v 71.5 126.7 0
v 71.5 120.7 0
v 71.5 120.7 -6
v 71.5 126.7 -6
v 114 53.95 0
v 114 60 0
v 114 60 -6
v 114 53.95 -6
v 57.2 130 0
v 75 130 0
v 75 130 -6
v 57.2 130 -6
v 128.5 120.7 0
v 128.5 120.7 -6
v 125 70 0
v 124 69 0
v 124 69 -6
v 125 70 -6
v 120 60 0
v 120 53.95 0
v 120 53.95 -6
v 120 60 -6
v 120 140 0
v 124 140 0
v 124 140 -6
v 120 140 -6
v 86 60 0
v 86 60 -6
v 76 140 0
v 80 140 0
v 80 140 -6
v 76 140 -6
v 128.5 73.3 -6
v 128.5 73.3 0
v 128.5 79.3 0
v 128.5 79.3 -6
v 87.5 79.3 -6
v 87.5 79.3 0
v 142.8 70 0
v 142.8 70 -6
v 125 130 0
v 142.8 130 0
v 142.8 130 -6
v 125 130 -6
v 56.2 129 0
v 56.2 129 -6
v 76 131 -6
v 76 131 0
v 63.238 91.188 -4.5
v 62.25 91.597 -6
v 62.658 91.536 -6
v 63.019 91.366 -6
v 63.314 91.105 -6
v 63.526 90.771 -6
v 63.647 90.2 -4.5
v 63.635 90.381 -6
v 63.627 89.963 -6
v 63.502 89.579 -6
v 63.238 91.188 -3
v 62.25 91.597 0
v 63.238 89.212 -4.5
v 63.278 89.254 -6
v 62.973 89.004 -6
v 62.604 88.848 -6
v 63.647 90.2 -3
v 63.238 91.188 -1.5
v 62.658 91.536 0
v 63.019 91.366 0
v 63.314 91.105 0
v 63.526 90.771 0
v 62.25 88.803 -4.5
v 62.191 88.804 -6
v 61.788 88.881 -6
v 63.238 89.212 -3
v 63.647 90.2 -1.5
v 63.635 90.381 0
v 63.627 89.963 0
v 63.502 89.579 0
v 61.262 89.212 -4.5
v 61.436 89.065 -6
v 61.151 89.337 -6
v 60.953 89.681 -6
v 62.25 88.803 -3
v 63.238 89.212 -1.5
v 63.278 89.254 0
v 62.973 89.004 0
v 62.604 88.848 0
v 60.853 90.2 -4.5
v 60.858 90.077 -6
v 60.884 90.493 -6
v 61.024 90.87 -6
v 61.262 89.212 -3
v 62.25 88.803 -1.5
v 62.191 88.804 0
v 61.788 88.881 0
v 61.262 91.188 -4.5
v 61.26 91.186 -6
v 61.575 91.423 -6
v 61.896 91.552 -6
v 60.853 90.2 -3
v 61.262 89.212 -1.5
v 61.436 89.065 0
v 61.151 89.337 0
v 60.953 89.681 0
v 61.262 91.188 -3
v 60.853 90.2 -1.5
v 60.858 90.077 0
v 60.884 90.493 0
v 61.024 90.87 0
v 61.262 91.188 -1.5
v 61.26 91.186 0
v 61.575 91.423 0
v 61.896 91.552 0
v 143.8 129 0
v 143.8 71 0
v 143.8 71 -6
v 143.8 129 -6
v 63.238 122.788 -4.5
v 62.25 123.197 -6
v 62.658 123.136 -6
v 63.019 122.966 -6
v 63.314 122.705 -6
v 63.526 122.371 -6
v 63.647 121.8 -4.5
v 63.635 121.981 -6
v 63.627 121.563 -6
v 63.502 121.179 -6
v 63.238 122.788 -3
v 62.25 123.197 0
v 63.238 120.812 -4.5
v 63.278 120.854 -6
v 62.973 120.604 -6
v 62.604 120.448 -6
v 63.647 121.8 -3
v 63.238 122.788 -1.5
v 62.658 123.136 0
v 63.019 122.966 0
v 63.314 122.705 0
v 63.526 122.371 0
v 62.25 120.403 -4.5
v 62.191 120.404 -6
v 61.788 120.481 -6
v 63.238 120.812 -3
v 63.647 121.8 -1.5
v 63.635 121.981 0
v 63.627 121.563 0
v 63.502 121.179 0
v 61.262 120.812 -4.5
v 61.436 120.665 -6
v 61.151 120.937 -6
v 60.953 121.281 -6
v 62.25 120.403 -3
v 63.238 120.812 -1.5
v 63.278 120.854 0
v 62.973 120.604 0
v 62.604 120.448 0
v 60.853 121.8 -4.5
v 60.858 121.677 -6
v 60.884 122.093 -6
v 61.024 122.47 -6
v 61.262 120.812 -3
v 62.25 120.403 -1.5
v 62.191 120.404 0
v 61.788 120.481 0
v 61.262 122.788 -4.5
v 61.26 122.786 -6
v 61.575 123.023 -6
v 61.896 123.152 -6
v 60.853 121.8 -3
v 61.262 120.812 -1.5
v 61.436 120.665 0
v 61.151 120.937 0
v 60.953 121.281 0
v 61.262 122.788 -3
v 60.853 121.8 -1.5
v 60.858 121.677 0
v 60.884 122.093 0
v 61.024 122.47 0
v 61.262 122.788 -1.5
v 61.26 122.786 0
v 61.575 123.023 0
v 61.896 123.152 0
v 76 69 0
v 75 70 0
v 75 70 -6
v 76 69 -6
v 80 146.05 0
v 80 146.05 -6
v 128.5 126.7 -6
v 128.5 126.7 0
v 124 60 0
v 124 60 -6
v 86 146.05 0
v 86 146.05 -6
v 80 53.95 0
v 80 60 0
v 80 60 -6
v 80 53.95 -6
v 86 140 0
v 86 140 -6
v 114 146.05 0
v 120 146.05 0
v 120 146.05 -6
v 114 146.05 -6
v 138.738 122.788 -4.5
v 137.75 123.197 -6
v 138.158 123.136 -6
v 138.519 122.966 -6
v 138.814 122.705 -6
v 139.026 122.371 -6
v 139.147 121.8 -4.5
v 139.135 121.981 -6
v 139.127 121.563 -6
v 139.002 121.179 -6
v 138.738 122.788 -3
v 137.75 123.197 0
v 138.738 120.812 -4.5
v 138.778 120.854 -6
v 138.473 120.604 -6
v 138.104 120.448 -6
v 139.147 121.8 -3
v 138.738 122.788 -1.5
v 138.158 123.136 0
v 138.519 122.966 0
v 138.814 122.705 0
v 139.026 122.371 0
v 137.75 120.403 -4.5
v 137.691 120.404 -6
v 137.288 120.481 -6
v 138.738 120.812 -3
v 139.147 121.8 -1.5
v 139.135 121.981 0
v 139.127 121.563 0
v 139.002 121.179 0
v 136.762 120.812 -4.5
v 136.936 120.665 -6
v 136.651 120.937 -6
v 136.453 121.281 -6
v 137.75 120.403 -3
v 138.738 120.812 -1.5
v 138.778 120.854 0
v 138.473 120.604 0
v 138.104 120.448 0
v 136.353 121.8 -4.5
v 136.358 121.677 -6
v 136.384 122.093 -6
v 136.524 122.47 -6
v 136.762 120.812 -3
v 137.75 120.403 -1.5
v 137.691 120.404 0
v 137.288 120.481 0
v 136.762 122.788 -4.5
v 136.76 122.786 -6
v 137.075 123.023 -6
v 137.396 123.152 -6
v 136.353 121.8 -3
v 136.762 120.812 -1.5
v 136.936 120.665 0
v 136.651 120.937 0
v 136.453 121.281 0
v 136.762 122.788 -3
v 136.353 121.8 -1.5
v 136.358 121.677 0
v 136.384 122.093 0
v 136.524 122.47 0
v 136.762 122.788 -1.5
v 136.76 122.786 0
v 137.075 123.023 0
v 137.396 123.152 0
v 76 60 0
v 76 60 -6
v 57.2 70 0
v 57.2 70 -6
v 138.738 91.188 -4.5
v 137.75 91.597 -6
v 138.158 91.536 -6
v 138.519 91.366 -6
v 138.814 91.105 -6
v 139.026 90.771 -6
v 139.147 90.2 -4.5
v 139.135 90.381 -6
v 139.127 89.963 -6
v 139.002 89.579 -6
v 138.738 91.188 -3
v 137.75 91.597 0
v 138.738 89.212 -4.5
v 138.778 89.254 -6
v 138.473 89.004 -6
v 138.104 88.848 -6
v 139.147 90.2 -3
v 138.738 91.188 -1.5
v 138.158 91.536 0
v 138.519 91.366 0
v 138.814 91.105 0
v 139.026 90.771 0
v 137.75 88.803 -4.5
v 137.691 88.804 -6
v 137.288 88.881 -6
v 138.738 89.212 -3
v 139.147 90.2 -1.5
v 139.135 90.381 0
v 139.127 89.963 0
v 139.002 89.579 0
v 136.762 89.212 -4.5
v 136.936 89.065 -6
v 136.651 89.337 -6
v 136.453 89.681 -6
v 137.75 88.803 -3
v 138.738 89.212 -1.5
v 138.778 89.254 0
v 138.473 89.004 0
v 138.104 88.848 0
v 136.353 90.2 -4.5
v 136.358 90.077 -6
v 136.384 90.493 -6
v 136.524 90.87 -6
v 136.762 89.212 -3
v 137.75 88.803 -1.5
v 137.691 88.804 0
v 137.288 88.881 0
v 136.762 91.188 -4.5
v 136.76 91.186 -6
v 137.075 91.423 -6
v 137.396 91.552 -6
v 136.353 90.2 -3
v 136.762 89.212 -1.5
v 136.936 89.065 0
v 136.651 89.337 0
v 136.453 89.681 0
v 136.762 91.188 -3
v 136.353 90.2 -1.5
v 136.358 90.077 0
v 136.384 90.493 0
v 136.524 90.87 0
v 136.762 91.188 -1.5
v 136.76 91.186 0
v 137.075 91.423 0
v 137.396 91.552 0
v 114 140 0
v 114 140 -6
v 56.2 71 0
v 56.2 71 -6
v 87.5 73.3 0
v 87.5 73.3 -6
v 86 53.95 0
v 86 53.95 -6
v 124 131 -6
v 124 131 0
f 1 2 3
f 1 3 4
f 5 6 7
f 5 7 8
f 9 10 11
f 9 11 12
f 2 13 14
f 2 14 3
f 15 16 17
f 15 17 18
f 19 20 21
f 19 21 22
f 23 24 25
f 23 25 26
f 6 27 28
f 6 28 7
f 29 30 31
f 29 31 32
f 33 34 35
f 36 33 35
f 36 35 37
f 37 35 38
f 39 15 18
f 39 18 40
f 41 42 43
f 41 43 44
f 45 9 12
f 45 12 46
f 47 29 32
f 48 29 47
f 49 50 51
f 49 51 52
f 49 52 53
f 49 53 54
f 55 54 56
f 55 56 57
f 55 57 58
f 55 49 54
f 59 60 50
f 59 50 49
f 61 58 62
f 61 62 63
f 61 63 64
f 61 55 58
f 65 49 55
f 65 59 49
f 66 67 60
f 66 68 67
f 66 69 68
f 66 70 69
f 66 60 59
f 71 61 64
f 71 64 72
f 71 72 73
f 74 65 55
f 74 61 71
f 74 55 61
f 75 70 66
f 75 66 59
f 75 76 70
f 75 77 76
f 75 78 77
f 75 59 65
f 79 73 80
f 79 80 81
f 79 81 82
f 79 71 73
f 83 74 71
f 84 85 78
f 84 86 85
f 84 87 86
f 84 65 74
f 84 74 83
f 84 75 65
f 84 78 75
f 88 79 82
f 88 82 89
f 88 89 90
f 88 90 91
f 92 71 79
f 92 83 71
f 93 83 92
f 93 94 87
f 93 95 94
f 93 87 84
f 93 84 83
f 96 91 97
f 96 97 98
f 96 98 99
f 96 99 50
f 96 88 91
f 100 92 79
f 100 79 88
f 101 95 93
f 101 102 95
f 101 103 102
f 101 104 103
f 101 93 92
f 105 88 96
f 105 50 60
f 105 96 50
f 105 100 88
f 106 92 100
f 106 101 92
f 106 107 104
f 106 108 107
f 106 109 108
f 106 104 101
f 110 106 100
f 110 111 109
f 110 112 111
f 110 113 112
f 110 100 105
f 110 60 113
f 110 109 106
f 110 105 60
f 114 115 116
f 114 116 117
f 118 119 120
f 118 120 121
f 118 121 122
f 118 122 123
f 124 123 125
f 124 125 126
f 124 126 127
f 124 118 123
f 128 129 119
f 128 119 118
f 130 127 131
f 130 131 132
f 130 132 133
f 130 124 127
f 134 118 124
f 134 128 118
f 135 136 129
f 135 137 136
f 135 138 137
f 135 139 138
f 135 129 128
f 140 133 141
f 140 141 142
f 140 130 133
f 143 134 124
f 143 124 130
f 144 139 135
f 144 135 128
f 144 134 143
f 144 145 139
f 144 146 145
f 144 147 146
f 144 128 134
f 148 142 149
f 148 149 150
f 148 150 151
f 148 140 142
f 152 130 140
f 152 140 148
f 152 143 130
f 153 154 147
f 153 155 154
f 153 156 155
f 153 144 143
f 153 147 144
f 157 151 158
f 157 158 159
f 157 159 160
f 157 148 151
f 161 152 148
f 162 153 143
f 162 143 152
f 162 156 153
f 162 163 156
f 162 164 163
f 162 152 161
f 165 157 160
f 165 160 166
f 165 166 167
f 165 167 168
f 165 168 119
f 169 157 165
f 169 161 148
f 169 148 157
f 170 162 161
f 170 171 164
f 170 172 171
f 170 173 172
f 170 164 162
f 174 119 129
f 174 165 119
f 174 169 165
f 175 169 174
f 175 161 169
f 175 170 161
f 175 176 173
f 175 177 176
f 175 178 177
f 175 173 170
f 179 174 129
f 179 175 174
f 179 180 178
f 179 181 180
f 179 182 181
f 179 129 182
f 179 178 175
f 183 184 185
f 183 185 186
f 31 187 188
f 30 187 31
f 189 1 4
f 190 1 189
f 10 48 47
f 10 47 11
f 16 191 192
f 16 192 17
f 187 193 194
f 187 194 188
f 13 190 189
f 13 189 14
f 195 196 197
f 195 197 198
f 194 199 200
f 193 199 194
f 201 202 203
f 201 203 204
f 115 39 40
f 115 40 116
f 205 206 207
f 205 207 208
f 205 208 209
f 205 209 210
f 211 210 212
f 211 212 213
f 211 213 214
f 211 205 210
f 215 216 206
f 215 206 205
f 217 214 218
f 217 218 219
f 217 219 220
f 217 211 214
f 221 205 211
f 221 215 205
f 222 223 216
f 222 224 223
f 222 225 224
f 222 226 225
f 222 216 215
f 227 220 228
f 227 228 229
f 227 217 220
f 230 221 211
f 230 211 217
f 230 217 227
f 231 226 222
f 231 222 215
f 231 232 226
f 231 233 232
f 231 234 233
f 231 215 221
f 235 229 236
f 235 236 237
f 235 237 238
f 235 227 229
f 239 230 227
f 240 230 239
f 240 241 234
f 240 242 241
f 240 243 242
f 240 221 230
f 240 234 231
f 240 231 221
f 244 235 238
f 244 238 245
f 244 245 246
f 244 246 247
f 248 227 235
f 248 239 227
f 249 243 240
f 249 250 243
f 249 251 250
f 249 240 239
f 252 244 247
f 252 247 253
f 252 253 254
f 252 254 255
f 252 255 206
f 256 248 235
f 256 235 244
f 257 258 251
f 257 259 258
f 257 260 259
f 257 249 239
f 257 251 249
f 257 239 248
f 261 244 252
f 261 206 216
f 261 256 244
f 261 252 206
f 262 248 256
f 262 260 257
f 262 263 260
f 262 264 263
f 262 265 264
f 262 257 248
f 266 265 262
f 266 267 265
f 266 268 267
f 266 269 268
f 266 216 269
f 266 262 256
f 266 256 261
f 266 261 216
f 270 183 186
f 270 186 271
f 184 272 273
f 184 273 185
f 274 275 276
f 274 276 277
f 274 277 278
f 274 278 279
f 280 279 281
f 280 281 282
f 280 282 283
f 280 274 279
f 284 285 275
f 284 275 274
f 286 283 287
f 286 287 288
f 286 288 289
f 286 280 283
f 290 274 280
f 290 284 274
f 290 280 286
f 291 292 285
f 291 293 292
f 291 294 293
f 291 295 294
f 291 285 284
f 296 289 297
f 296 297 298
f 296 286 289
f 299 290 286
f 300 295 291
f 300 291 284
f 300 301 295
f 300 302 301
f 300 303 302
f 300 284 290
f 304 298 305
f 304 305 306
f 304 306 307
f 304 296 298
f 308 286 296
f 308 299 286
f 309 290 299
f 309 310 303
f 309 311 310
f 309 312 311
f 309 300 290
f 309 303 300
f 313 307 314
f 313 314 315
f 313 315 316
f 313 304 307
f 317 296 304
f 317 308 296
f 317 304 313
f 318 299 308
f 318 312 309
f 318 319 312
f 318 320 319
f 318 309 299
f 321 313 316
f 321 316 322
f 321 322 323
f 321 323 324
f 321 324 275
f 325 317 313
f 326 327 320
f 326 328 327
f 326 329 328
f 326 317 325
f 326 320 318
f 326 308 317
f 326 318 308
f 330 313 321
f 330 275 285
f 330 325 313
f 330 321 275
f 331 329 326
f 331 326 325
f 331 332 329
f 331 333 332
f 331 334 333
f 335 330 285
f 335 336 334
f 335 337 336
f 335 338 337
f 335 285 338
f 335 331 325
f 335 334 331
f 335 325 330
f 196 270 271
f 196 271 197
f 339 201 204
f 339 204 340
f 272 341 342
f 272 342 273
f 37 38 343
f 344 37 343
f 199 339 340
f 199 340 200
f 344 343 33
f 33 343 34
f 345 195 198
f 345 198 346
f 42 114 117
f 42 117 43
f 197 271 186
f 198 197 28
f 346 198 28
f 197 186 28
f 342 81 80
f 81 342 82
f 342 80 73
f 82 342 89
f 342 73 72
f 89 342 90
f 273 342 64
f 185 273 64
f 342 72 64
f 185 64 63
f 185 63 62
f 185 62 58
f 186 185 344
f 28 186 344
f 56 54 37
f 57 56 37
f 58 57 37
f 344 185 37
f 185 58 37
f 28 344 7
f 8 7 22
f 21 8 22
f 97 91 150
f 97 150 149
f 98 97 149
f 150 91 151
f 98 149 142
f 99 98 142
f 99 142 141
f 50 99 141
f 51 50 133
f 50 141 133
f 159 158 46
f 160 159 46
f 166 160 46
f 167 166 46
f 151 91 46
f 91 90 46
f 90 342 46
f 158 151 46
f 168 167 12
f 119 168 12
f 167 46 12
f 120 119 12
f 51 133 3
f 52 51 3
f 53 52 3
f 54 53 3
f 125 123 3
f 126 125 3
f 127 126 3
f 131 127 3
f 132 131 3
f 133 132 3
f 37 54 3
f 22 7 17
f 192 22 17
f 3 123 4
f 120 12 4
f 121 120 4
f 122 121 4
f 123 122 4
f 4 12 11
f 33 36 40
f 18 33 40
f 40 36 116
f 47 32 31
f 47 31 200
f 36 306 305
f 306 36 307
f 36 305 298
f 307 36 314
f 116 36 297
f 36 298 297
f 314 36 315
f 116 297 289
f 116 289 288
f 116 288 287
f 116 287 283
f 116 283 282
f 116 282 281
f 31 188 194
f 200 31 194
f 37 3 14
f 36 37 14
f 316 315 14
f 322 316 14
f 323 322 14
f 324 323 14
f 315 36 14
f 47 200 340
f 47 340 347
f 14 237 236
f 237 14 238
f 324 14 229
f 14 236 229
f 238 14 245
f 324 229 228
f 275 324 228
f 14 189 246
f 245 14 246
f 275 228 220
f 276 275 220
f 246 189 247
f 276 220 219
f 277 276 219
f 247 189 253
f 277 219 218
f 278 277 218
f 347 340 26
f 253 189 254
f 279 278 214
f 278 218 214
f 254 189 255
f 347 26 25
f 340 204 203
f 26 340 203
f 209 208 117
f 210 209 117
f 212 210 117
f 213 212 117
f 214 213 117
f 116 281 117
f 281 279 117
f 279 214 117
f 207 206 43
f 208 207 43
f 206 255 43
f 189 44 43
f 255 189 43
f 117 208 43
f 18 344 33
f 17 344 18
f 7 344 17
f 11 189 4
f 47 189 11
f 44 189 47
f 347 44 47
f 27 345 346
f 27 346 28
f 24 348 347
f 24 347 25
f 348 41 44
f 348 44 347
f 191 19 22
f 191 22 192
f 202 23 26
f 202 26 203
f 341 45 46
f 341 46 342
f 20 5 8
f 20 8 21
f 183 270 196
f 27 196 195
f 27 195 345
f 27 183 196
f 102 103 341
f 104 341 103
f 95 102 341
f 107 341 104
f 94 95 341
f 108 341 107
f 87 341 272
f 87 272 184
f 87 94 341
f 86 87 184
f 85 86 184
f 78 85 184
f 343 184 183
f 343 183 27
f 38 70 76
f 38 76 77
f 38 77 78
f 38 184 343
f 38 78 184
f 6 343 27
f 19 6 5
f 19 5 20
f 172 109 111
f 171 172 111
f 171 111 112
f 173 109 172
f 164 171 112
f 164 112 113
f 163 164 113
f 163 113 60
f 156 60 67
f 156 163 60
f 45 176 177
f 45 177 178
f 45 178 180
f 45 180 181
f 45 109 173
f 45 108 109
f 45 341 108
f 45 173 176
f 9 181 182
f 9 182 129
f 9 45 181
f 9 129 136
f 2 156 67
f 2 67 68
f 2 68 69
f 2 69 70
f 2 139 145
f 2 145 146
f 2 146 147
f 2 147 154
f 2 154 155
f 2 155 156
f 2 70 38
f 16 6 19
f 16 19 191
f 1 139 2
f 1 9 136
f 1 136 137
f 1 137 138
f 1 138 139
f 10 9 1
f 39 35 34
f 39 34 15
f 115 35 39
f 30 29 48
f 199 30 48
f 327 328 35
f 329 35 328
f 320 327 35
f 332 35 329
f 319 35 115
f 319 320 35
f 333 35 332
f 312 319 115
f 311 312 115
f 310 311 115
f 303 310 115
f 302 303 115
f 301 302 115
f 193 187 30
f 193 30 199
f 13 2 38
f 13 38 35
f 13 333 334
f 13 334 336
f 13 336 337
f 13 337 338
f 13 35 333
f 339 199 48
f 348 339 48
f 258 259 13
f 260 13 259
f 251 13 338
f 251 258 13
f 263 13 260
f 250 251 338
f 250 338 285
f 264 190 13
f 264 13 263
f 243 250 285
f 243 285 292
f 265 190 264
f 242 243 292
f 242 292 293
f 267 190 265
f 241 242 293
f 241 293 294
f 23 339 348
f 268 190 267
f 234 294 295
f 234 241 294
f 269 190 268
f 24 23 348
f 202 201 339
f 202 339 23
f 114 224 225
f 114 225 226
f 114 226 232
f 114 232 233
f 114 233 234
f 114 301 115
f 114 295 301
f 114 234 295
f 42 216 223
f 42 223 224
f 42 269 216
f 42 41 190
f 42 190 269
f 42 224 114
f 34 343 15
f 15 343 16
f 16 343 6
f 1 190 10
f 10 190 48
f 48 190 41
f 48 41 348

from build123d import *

# Parameters (mm, degrees)
SALIENTE_EXTRUIR1_DEPTH = 6


with BuildPart() as part:
    # Corte → Saliente-Extruir1 (new body)
    with BuildSketch(Plane.XY):
        Polygon((113.99992211, 146.05), (113.999928646, 140), (86.000028142, 140), (86.000028142, 146.05), (80.000028142, 146.05), (80.000028142, 140), (76.000028142, 140), (76.000028142, 131.000000972), (75.000028142, 130.000001013), (57.20005465, 130.000001734), (56.20005465, 129.000001774), (56.20005465, 71.000001774), (57.20005465, 70.000001734), (75.000028142, 70.000001013), (76.000028142, 69.000000972), (76.000028142, 60), (80.000028142, 60), (80.000028142, 53.95), (86.000028142, 53.95), (86.000028142, 60), (114.00001507, 60), (114.000021606, 53.95), (120.000021606, 53.95), (120.00001507, 60), (124.00001507, 60), (124.000005347, 68.999999028), (125.000004267, 69.999998987), (142.80005465, 69.999998266), (143.80005465, 70.999998226), (143.80005465, 128.999998226), (142.80005465, 129.999998266), (124.999939449, 129.999998987), (123.999938369, 130.999999028), (123.999928646, 140), (119.999928646, 140), (119.99992211, 146.05), align=None)
        Polygon((71.50005465, 126.700001641), (128.50005465, 126.699998845), (128.50005465, 120.699998845), (71.50005465, 120.700001155), align=None, mode=Mode.SUBTRACT)
        Polygon((87.50005465, 73.300000506), (128.50005465, 73.299998359), (128.50005465, 79.299998845), (87.50005465, 79.300000506), align=None, mode=Mode.SUBTRACT)
        with BuildLine():
            add(Edge.make_bspline(
                [(139.147057668, 90.199998471), (139.147059335, 89.428473471), (138.521585686, 88.802997119), (137.750060686, 88.802995452)],
                knots=[0, 0, 0, 0, 1, 1, 1, 1], degree=3))
            add(Edge.make_bspline(
                [(137.750060686, 88.802995452), (136.978535686, 88.802993785), (136.353059335, 89.428467434), (136.353057668, 90.199992434)],
                knots=[0, 0, 0, 0, 1, 1, 1, 1], degree=3))
            add(Edge.make_bspline(
                [(136.353057668, 90.199992434), (136.353056001, 90.971517434), (136.97852965, 91.596993785), (137.75005465, 91.596995452)],
                knots=[0, 0, 0, 0, 1, 1, 1, 1], degree=3))
            add(Edge.make_bspline(
                [(137.75005465, 91.596995452), (138.52157965, 91.596997119), (139.147056001, 90.971523471), (139.147057668, 90.199998471)],
                knots=[0, 0, 0, 0, 1, 1, 1, 1], degree=3))
        make_face(mode=Mode.SUBTRACT)
        with BuildLine():
            add(Edge.make_bspline(
                [(139.147057668, 121.799998471), (139.147059335, 121.028473471), (138.521585686, 120.402997119), (137.750060686, 120.402995452)],
                knots=[0, 0, 0, 0, 1, 1, 1, 1], degree=3))
            add(Edge.make_bspline(
                [(137.750060686, 120.402995452), (136.978535686, 120.402993785), (136.353059335, 121.028467434), (136.353057668, 121.799992434)],
                knots=[0, 0, 0, 0, 1, 1, 1, 1], degree=3))
            add(Edge.make_bspline(
                [(136.353057668, 121.799992434), (136.353056001, 122.571517434), (136.97852965, 123.196993785), (137.75005465, 123.196995452)],
                knots=[0, 0, 0, 0, 1, 1, 1, 1], degree=3))
            add(Edge.make_bspline(
                [(137.75005465, 123.196995452), (138.52157965, 123.196997119), (139.147056001, 122.571523471), (139.147057668, 121.799998471)],
                knots=[0, 0, 0, 0, 1, 1, 1, 1], degree=3))
        make_face(mode=Mode.SUBTRACT)
        with BuildLine():
            add(Edge.make_bspline(
                [(63.647057668, 121.800001529), (63.647059335, 121.028476529), (63.021585686, 120.403000178), (62.250060686, 120.402998511)],
                knots=[0, 0, 0, 0, 1, 1, 1, 1], degree=3))
            add(Edge.make_bspline(
                [(62.250060686, 120.402998511), (61.478535686, 120.402996844), (60.853059335, 121.028470493), (60.853057668, 121.799995493)],
                knots=[0, 0, 0, 0, 1, 1, 1, 1], degree=3))
            add(Edge.make_bspline(
                [(60.853057668, 121.799995493), (60.853056001, 122.571520493), (61.47852965, 123.196996844), (62.25005465, 123.196998511)],
                knots=[0, 0, 0, 0, 1, 1, 1, 1], degree=3))
            add(Edge.make_bspline(
                [(62.25005465, 123.196998511), (63.02157965, 123.197000178), (63.647056001, 122.571526529), (63.647057668, 121.800001529)],
                knots=[0, 0, 0, 0, 1, 1, 1, 1], degree=3))
        make_face(mode=Mode.SUBTRACT)
        with BuildLine():
            add(Edge.make_bspline(
                [(63.647057668, 90.200001529), (63.647059335, 89.428476529), (63.021585686, 88.803000178), (62.250060686, 88.802998511)],
                knots=[0, 0, 0, 0, 1, 1, 1, 1], degree=3))
            add(Edge.make_bspline(
                [(62.250060686, 88.802998511), (61.478535686, 88.802996844), (60.853059335, 89.428470493), (60.853057668, 90.199995493)],
                knots=[0, 0, 0, 0, 1, 1, 1, 1], degree=3))
            add(Edge.make_bspline(
                [(60.853057668, 90.199995493), (60.853056001, 90.971520493), (61.47852965, 91.596996844), (62.25005465, 91.596998511)],
                knots=[0, 0, 0, 0, 1, 1, 1, 1], degree=3))
            add(Edge.make_bspline(
                [(62.25005465, 91.596998511), (63.02157965, 91.597000178), (63.647056001, 90.971526529), (63.647057668, 90.200001529)],
                knots=[0, 0, 0, 0, 1, 1, 1, 1], degree=3))
        make_face(mode=Mode.SUBTRACT)
    extrude(amount=-SALIENTE_EXTRUIR1_DEPTH)


solid = part.part
